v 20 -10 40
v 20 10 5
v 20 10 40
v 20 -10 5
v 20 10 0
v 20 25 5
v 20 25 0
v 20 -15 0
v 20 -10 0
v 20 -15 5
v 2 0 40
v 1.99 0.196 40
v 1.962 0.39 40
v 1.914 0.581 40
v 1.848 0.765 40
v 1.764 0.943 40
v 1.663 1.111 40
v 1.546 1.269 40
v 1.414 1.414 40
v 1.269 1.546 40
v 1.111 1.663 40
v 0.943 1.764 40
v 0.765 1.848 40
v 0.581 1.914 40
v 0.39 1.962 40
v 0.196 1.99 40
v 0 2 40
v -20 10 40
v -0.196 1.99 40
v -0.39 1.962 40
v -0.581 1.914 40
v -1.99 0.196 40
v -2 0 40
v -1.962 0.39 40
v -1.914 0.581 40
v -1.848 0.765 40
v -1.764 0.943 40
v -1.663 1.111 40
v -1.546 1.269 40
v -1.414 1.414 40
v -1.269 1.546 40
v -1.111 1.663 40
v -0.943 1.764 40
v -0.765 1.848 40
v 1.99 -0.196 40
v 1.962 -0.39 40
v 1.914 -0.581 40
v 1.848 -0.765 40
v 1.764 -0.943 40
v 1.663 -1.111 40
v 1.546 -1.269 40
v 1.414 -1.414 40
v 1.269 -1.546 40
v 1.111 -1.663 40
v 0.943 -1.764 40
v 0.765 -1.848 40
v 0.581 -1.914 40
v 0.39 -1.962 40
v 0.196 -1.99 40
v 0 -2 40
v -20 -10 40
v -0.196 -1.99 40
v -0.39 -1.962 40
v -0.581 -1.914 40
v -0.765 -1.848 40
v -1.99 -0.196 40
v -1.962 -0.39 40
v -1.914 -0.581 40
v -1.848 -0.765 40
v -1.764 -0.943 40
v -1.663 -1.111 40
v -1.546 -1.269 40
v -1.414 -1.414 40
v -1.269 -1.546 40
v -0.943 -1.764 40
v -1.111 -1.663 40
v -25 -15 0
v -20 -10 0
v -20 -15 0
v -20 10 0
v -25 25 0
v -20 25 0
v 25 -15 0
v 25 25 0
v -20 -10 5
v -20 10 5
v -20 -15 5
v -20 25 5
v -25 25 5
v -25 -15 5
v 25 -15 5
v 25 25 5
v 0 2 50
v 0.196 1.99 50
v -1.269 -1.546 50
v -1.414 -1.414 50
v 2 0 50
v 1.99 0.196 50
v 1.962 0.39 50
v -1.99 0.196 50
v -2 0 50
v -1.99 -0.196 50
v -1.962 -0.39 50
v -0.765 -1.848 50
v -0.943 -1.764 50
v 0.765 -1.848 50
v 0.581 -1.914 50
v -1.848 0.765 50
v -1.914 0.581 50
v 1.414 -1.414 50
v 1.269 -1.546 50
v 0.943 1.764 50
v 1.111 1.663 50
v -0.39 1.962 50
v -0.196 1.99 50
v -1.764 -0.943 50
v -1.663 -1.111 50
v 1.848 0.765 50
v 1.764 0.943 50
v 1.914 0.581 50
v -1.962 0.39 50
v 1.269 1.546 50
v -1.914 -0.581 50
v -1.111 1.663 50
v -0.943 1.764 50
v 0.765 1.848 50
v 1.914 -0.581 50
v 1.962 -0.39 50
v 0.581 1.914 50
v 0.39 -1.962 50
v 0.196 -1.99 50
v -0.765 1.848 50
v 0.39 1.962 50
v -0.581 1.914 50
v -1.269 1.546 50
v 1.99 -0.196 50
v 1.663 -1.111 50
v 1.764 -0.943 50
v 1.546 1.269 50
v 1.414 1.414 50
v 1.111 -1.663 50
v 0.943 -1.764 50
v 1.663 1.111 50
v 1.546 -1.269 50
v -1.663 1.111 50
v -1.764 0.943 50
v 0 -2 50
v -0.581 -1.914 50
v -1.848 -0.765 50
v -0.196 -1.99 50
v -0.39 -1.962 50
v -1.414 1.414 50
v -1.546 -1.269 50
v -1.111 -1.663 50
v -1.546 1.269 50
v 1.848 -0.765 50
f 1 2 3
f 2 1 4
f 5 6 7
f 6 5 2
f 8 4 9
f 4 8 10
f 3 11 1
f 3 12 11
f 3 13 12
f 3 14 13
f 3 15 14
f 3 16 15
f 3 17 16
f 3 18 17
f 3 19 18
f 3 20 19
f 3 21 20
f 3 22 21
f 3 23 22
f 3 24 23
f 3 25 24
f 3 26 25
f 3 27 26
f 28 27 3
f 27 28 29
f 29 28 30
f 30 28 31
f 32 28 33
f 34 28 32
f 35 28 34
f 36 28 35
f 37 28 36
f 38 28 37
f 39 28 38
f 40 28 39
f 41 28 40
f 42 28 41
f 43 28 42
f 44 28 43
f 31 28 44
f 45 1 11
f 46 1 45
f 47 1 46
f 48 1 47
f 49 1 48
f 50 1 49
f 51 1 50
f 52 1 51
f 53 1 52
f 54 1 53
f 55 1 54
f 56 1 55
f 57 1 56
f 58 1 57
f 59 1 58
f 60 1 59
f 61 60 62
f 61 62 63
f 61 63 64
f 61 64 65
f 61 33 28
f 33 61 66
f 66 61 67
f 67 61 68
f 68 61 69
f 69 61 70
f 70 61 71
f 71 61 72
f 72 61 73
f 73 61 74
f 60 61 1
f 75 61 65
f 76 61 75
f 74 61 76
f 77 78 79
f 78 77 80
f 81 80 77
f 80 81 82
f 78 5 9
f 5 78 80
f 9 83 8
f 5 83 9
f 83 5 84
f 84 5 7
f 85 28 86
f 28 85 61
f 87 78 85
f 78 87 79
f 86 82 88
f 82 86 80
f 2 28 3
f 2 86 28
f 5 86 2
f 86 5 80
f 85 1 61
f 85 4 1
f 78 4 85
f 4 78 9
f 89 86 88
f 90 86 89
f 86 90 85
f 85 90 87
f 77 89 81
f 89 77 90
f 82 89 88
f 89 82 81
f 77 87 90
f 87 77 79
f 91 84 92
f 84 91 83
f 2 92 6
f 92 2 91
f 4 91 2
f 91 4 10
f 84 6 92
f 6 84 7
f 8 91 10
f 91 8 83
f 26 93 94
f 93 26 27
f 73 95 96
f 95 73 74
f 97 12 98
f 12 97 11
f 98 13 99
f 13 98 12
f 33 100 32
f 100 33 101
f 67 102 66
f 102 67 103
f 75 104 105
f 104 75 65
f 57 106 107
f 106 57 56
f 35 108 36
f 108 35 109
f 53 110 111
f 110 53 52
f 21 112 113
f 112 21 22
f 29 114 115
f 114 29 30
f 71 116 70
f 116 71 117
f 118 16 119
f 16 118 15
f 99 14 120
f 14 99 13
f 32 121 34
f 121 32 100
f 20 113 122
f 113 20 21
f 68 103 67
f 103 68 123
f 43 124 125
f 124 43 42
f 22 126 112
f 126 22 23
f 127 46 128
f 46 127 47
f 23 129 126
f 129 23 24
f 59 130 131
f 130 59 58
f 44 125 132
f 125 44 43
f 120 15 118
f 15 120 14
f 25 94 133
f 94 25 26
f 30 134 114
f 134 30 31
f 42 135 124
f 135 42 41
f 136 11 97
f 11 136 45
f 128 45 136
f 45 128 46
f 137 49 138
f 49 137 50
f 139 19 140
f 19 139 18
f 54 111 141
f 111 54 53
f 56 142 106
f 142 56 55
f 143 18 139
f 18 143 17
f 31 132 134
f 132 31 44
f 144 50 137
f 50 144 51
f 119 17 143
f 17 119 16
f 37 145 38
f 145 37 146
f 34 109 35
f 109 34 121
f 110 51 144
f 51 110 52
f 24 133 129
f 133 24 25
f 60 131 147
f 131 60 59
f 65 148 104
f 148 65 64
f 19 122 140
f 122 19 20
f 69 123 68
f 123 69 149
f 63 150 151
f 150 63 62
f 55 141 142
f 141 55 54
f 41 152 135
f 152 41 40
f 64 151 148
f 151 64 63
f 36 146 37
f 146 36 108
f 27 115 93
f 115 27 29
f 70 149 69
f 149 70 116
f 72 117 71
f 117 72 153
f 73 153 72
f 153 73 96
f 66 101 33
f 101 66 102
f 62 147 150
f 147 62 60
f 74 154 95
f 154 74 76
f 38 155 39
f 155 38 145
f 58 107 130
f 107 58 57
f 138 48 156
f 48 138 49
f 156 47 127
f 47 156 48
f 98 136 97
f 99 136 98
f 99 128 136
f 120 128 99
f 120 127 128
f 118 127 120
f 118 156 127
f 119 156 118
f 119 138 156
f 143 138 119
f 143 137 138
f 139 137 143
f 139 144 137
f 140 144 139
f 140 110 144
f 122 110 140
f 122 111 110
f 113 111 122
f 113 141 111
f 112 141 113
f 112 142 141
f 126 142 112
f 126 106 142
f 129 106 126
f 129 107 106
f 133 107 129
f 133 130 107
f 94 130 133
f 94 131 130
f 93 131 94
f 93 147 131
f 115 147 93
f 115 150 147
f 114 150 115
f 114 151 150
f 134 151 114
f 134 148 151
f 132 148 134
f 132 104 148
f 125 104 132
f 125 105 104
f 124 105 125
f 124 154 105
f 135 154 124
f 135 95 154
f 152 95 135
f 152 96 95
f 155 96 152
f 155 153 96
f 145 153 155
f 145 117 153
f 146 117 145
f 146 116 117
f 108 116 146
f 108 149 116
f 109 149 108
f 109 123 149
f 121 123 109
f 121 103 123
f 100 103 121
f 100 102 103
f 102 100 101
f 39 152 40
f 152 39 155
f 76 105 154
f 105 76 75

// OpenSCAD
module servo_motor() {
    difference() {
        // Main body of the servo motor
        translate([-20, -10, 0])
            cube([40, 20, 40]);

        // Shaft hole
        translate([0, 0, 40])
            cylinder(h=10, r=2, $fn=64);
    }
    
    // Mounting flanges
    translate([-25, -15, 0])
        cube([5, 40, 5]);
    translate([20, -15, 0])
        cube([5, 40, 5]);
    
    // Shaft
    translate([0, 0, 40])
        cylinder(h=10, r=2, $fn=64);
}

servo_motor();
